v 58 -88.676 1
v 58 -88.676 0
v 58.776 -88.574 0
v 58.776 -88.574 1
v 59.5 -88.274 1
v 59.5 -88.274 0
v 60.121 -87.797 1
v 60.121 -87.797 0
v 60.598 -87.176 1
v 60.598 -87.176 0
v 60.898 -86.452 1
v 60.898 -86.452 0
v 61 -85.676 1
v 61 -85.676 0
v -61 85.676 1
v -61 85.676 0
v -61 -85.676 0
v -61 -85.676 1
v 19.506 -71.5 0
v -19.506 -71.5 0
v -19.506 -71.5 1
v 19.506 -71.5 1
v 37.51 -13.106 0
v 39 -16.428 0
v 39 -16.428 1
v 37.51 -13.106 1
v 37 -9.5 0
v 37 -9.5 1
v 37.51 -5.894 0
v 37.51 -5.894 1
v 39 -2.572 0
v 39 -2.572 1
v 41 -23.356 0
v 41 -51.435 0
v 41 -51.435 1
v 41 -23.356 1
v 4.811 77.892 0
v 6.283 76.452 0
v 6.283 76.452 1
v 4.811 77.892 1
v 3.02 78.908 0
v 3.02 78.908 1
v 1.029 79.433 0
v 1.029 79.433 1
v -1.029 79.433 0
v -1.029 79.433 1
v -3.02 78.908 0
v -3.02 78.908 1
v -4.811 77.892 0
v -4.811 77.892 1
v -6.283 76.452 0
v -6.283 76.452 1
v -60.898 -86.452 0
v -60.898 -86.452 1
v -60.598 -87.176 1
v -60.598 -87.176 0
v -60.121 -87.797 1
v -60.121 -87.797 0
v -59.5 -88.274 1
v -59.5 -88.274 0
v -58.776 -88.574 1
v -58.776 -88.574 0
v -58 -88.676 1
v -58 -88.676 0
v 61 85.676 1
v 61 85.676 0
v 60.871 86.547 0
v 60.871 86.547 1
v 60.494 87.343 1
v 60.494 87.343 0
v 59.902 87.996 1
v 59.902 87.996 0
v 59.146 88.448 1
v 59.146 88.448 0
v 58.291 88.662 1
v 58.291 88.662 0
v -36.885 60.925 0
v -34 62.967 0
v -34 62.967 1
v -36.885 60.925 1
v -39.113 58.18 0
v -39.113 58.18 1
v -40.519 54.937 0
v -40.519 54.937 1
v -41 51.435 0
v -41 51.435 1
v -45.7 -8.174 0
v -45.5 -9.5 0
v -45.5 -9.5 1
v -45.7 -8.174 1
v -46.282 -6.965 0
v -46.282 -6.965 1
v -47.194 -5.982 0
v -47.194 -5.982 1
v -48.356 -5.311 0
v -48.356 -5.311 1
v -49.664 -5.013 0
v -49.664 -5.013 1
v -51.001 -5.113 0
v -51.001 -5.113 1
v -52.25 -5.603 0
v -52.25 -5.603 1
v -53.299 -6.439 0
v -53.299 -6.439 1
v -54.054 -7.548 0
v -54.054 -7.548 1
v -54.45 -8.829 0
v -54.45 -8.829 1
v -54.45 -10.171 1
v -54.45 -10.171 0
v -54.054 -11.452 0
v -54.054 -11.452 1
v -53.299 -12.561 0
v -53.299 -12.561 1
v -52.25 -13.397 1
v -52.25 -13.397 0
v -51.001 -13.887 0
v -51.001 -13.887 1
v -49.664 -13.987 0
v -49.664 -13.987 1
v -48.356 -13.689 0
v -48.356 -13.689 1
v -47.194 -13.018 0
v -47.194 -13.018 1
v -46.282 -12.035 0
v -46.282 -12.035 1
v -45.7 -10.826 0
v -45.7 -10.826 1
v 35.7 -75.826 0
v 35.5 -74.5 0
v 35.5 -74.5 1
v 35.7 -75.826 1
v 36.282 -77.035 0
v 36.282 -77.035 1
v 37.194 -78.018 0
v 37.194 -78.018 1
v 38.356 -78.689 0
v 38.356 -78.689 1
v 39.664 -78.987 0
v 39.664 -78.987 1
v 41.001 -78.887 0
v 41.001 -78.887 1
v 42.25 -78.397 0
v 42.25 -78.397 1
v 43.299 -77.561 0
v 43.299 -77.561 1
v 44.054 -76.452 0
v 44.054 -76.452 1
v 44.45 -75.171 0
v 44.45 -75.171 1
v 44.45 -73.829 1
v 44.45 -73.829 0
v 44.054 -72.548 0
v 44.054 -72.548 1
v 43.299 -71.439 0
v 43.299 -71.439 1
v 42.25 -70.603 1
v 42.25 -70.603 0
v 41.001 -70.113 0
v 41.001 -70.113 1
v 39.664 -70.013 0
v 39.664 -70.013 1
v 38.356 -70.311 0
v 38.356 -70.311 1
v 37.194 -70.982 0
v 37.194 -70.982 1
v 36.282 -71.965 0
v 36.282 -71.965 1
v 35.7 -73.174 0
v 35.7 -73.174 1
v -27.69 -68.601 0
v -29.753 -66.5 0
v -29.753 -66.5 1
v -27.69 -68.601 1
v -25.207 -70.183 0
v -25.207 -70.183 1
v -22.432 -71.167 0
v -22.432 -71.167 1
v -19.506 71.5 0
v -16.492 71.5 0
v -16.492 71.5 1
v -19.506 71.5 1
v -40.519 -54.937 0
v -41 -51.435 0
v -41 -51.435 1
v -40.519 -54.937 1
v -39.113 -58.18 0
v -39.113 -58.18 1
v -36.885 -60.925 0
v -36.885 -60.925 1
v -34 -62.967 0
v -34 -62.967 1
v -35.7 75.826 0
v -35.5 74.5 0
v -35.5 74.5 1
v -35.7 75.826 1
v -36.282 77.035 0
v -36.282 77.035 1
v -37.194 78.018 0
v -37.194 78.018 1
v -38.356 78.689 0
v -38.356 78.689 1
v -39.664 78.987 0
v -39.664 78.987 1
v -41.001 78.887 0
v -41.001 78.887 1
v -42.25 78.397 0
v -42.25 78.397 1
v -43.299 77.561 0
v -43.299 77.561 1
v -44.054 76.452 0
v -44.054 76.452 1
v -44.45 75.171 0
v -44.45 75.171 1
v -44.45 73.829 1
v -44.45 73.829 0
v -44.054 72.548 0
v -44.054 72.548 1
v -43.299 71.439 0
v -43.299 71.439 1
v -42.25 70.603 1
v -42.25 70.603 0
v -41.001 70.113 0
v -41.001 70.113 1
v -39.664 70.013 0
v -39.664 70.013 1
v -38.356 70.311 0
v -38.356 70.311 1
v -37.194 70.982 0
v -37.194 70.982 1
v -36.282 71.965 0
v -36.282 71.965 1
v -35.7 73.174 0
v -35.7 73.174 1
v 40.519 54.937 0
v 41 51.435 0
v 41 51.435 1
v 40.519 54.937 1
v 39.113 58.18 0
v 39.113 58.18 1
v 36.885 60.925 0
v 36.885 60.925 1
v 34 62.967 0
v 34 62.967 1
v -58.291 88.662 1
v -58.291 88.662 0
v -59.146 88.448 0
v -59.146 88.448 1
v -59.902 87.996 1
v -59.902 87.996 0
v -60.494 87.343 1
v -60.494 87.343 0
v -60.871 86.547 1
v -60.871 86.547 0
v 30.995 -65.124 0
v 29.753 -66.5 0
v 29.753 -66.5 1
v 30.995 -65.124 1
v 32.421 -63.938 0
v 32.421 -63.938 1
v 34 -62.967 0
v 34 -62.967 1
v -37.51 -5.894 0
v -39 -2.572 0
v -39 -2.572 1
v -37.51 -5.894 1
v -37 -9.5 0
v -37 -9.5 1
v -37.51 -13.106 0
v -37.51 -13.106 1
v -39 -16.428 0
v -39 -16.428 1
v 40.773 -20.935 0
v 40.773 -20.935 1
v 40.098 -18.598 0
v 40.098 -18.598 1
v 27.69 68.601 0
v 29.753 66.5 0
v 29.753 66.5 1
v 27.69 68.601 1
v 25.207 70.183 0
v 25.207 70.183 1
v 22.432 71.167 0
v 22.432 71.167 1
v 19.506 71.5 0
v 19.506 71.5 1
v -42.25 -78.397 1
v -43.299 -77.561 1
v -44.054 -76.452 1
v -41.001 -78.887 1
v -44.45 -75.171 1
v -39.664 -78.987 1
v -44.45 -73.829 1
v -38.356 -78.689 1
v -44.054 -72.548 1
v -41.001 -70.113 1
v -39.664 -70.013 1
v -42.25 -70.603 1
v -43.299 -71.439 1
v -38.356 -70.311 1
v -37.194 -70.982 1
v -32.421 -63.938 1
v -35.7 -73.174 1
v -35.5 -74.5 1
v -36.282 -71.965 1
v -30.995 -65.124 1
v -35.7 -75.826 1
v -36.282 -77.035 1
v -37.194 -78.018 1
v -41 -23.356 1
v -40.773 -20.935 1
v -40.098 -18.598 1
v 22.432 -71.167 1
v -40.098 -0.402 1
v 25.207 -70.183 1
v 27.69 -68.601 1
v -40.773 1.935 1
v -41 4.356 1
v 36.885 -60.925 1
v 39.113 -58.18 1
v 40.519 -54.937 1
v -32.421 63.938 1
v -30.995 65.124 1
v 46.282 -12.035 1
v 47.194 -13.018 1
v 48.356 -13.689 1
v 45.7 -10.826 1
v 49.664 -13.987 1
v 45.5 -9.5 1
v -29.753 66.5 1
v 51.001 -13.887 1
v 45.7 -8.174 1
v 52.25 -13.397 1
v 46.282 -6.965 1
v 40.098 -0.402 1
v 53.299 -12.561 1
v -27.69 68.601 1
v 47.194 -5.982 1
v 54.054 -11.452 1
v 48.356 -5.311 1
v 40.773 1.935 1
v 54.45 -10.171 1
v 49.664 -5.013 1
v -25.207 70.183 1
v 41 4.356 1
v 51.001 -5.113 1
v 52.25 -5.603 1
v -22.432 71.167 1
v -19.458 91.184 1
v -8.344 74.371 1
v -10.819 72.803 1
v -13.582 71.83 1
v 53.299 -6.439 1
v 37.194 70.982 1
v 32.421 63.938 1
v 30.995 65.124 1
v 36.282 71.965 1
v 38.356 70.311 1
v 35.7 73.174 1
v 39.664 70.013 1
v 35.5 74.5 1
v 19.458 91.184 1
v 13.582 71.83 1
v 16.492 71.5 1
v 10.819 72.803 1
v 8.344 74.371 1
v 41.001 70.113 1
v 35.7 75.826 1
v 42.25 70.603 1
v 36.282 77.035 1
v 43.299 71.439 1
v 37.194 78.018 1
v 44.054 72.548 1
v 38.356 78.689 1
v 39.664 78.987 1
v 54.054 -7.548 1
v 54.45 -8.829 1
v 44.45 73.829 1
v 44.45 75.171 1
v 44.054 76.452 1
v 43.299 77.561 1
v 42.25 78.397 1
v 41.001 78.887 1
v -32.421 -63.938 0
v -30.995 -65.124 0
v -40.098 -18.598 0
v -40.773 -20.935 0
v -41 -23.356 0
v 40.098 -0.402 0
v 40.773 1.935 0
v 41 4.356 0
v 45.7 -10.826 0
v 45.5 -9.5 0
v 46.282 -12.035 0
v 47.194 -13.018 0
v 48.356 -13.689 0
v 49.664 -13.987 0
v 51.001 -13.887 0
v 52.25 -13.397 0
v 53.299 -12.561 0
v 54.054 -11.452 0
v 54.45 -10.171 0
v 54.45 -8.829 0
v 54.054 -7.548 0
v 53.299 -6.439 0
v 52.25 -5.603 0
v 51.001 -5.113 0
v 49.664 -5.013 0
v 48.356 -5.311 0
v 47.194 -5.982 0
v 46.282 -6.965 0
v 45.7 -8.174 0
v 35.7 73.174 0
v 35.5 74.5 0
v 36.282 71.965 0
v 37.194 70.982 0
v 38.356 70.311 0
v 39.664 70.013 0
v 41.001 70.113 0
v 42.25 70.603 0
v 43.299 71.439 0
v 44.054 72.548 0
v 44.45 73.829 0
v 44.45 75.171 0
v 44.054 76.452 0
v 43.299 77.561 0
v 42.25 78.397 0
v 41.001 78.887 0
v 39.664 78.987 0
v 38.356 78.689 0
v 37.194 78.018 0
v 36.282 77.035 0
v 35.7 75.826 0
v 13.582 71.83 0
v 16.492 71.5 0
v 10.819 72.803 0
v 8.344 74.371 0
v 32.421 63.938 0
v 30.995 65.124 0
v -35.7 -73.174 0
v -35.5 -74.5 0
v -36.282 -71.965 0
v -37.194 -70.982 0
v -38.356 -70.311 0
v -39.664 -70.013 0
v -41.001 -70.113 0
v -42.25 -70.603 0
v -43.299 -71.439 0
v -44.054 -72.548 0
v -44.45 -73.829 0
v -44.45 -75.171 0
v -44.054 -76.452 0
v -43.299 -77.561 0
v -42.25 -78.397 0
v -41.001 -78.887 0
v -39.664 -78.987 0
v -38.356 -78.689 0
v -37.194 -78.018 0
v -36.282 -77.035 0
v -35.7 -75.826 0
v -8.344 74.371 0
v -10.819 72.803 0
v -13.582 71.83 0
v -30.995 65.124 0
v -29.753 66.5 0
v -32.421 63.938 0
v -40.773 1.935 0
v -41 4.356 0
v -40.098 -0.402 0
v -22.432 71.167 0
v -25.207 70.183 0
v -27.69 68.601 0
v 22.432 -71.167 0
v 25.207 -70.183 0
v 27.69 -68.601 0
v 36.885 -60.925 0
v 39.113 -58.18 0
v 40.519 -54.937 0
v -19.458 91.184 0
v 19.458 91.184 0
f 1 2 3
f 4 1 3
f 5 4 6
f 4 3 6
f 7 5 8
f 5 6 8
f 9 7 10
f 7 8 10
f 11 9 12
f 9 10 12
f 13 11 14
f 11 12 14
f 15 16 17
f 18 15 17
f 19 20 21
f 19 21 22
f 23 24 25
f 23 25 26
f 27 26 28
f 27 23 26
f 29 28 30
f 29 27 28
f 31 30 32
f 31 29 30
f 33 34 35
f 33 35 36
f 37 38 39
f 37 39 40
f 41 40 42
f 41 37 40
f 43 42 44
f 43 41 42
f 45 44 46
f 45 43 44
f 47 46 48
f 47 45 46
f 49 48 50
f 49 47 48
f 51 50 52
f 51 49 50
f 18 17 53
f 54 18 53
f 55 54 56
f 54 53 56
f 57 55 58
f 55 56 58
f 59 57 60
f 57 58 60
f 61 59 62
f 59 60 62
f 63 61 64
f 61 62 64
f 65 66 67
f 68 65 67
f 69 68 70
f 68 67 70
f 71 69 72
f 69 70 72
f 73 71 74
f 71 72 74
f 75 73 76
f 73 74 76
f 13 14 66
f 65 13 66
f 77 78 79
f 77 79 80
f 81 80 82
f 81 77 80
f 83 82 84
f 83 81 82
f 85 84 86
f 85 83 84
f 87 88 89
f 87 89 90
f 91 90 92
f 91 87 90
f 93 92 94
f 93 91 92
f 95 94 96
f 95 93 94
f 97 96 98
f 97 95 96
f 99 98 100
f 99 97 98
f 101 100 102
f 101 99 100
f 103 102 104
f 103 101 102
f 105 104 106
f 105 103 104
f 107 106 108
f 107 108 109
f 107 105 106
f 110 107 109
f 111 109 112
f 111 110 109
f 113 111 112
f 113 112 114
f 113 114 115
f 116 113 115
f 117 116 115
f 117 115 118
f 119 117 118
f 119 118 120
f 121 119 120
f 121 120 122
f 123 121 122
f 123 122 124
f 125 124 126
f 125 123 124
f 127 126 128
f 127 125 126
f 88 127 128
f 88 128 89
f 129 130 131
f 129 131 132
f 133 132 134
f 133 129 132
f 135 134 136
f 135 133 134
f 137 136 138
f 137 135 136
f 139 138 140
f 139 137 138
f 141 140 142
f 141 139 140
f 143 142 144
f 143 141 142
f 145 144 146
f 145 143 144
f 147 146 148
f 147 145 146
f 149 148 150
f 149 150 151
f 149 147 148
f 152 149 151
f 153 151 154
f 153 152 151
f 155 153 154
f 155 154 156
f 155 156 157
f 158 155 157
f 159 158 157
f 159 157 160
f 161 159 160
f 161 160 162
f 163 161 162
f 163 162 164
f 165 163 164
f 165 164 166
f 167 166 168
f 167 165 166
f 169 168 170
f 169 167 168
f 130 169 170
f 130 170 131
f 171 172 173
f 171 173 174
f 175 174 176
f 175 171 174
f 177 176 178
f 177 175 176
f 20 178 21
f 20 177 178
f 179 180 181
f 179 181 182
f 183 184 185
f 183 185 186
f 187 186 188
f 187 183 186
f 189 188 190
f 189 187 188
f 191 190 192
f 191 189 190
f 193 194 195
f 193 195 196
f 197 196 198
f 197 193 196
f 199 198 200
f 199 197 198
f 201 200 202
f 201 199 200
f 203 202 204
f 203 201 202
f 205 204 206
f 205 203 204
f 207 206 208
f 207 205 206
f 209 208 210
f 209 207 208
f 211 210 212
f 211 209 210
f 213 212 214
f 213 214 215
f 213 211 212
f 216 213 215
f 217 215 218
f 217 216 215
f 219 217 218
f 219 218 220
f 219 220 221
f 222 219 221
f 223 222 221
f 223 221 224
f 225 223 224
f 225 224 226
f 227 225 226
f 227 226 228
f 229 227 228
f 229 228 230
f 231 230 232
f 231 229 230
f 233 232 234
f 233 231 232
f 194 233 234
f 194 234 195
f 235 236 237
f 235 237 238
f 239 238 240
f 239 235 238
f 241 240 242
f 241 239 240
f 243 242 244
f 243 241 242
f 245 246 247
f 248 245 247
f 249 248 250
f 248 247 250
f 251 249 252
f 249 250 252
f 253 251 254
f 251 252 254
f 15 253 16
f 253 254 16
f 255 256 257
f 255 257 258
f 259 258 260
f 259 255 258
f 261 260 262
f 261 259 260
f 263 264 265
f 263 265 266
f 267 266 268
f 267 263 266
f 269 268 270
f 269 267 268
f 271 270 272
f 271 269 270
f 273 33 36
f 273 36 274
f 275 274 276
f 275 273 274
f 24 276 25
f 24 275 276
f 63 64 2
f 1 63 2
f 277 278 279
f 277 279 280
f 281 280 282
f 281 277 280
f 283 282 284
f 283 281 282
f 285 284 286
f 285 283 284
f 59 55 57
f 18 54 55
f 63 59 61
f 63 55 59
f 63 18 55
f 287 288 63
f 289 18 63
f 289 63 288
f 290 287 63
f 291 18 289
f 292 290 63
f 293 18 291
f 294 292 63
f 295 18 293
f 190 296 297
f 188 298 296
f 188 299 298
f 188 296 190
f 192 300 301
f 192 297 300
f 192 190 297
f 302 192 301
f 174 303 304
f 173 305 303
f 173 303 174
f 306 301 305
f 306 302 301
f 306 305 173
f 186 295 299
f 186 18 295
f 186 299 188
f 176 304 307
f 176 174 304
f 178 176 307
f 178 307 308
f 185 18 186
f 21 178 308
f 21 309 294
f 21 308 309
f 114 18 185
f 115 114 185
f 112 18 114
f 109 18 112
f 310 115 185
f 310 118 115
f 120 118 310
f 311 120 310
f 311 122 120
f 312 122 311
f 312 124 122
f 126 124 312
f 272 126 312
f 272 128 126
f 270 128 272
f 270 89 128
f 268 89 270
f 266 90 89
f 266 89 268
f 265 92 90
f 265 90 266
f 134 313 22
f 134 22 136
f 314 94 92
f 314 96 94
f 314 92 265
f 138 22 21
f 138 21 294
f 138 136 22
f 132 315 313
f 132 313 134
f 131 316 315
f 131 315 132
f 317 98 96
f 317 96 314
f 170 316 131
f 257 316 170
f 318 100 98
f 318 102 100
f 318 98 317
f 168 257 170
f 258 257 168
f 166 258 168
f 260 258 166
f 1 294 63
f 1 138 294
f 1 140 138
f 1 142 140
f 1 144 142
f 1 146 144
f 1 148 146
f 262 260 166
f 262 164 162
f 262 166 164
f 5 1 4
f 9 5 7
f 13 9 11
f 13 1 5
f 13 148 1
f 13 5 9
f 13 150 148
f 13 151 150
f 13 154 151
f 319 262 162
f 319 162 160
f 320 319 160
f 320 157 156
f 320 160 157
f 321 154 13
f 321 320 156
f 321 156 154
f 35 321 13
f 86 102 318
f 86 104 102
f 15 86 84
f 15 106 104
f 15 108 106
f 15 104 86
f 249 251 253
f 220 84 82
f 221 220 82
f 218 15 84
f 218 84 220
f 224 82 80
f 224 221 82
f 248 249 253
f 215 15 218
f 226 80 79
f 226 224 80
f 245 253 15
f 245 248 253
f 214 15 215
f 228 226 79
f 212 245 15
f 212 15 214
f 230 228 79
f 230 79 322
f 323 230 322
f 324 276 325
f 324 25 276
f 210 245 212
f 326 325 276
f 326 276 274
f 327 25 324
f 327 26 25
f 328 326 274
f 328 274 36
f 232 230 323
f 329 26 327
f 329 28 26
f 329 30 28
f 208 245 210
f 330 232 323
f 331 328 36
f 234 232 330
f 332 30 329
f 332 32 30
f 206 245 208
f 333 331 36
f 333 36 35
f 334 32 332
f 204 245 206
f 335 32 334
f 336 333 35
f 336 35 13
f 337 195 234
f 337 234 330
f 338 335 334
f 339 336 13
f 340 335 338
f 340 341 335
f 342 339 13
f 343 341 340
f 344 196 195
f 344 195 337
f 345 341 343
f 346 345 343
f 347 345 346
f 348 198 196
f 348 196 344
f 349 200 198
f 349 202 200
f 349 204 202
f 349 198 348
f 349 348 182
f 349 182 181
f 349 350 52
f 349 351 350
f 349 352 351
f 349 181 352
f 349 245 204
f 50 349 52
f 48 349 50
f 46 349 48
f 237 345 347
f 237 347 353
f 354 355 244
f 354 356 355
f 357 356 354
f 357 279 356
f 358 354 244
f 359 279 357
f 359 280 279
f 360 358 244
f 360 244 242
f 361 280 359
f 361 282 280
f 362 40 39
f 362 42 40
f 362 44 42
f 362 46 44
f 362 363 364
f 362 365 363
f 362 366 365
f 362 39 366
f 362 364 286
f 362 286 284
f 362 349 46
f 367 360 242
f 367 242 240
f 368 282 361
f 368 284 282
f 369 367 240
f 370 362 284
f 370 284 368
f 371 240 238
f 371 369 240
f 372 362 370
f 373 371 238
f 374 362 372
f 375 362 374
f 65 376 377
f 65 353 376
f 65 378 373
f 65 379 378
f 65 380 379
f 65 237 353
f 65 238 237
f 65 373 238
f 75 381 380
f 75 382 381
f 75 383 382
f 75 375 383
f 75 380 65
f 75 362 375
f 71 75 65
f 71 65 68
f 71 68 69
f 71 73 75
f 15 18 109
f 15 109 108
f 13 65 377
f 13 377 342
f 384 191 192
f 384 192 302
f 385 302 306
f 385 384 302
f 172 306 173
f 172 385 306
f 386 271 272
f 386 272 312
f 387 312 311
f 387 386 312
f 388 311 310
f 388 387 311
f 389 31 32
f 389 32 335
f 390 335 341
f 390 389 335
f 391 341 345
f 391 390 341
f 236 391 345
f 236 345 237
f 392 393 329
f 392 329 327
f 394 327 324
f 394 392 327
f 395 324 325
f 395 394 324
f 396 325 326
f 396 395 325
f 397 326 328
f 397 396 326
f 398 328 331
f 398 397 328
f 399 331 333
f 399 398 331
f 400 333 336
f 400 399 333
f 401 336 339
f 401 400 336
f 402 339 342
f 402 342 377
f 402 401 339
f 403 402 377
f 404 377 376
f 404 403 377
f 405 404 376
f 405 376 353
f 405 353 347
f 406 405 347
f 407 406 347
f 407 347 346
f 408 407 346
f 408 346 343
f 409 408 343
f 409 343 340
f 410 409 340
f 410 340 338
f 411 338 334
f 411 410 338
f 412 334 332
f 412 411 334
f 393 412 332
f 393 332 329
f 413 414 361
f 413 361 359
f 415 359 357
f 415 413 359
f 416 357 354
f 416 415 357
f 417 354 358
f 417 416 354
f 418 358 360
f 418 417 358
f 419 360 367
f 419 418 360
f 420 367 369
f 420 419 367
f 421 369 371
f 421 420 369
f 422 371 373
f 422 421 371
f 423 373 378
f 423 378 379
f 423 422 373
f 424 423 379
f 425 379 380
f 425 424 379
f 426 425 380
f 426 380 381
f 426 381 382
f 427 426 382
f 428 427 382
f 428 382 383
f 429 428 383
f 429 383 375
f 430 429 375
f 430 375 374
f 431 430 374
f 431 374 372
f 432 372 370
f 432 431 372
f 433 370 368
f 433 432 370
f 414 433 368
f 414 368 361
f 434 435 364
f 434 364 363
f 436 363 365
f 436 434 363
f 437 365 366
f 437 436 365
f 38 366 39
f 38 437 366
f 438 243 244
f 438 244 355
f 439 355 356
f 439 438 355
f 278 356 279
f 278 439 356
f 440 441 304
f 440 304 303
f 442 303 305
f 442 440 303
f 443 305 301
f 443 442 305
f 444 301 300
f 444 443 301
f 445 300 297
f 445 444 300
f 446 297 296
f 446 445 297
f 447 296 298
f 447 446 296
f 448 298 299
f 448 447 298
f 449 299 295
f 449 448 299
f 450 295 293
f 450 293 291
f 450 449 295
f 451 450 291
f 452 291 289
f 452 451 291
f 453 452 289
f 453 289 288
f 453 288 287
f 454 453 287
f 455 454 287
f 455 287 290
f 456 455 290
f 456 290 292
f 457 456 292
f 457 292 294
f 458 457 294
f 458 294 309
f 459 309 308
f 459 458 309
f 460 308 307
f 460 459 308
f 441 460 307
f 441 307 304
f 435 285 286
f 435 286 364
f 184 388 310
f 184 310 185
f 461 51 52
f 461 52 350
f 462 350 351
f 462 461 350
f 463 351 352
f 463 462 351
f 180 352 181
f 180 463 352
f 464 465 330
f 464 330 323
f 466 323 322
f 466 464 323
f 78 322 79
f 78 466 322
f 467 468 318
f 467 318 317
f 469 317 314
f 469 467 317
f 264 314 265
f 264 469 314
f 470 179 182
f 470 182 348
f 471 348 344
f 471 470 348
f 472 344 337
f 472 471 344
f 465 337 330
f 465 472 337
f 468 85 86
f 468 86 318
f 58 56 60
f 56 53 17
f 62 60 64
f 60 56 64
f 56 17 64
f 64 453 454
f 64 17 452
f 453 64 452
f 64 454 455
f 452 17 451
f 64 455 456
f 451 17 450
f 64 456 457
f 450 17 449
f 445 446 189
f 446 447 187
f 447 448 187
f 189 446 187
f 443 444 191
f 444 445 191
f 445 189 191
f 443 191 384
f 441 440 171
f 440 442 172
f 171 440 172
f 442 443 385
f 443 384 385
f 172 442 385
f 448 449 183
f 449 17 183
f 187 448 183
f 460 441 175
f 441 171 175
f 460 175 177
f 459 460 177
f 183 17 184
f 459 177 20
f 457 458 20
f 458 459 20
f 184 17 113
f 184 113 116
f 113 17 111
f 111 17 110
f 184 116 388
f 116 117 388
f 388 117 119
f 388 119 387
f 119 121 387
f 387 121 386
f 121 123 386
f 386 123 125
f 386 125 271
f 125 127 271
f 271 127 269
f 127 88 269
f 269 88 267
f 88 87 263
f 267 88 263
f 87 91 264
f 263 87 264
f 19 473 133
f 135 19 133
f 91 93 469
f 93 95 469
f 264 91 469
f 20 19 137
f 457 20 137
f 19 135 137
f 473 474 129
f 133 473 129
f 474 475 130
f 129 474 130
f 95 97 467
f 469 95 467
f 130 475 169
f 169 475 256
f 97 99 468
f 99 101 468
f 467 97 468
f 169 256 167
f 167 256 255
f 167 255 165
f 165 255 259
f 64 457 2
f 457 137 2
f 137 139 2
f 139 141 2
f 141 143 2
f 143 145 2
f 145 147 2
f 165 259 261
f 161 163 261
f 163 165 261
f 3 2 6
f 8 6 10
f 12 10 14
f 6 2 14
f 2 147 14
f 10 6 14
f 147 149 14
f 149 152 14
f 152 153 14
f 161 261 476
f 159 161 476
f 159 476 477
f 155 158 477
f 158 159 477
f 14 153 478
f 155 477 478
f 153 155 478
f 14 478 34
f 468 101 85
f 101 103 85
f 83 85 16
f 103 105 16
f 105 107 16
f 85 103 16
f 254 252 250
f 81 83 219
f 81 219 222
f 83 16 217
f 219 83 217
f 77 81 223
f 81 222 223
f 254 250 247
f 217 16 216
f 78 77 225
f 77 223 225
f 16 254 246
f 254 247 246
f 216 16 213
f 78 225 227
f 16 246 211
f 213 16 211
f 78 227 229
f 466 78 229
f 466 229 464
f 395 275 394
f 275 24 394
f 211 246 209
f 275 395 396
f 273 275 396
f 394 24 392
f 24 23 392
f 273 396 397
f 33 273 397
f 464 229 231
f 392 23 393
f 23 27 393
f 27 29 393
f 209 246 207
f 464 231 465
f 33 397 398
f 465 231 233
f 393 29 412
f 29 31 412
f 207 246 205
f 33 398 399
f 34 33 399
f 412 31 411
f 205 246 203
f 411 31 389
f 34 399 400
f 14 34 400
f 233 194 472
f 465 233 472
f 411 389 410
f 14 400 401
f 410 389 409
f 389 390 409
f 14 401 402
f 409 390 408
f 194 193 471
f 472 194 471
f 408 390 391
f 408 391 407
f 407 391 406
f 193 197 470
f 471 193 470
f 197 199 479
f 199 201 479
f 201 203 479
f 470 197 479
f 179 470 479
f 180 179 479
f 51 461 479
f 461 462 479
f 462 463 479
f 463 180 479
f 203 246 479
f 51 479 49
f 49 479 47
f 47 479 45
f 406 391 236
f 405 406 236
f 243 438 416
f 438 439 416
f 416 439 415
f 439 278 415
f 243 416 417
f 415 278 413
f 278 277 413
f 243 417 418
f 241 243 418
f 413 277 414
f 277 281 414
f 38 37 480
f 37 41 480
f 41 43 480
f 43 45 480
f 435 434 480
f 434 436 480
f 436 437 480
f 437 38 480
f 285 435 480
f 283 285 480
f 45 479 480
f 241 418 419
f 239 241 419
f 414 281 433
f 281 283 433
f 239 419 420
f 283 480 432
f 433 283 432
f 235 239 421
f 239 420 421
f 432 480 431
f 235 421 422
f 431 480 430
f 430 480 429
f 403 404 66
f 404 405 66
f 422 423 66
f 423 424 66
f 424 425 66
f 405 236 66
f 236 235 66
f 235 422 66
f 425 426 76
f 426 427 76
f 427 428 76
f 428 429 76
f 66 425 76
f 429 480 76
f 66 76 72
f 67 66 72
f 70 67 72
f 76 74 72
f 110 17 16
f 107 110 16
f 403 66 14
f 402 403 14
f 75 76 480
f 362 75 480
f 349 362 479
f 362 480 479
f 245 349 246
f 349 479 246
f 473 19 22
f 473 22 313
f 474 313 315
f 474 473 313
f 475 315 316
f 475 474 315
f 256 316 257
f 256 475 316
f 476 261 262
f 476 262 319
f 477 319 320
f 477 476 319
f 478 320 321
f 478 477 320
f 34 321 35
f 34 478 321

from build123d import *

# Parameters (mm, degrees)
SKETCH1_R           = 4.5
BOSS_EXTRUDE1_DEPTH = 1


with BuildPart() as part:
    # Sketch1 → Boss-Extrude1 (new body)
    with BuildSketch(Plane.XY):
        with BuildLine():
            Line((-61, 85.675899882), (-61, -85.675899882))
            ThreePointArc((-61, -85.675899882), (-60.121320344, -87.797220225), (-58, -88.675899882))
            Line((-58, -88.675899882), (58, -88.675899882))
            ThreePointArc((58, -88.675899882), (60.121320344, -87.797220225), (61, -85.675899882))
            Line((61, -85.675899882), (61, 85.675899882))
            ThreePointArc((61, 85.675899882), (60.221977932, 87.691542228), (58.291457286, 88.661708424))
            ThreePointArc((58.291457286, 88.661708424), (0, 91.5), (-58.291457286, 88.661708424))
            ThreePointArc((-58.291457286, 88.661708424), (-60.221977932, 87.691542228), (-61, 85.675899882))
        make_face()
        with Locations((-40, 74.5)):
            Circle(SKETCH1_R, mode=Mode.SUBTRACT)
        with Locations((-50, -9.5)):
            Circle(SKETCH1_R, mode=Mode.SUBTRACT)
        with Locations((-40, -74.5)):
            Circle(SKETCH1_R, mode=Mode.SUBTRACT)
        with Locations(Location((40, -74.5, 0), (0, 0, 180))):
            Circle(SKETCH1_R, mode=Mode.SUBTRACT)
        with Locations(Location((50, -9.5, 0), (0, 0, 180))):
            Circle(SKETCH1_R, mode=Mode.SUBTRACT)
        with Locations(Location((40, 74.5, 0), (0, 0, 180))):
            Circle(SKETCH1_R, mode=Mode.SUBTRACT)
        with BuildLine():
            Line((-41, -23.356406461), (-41, -51.434874811))
            ThreePointArc((-41, -51.434874811), (-39.113055385, -58.180243592), (-34, -62.967437405))
            ThreePointArc((-34, -62.967437405), (-31.68672135, -64.505531626), (-29.753049234, -66.5))
            ThreePointArc((-29.753049234, -66.5), (-25.206975594, -70.183321446), (-19.506098468, -71.5))
            Line((-19.506098468, -71.5), (19.506098468, -71.5))
            ThreePointArc((19.506098468, -71.5), (25.206975594, -70.183321446), (29.753049234, -66.5))
            ThreePointArc((29.753049234, -66.5), (31.68672135, -64.505531626), (34, -62.967437405))
            ThreePointArc((34, -62.967437405), (39.113055385, -58.180243592), (41, -51.434874811))
            Line((41, -51.434874811), (41, -23.356406461))
            ThreePointArc((41, -23.356406461), (40.489995997, -19.750855185), (39, -16.42820323))
            ThreePointArc((39, -16.42820323), (37, -9.5), (39, -2.57179677))
            ThreePointArc((39, -2.57179677), (40.489995997, 0.750855185), (41, 4.356406461))
            Line((41, 4.356406461), (41, 51.434874811))
            ThreePointArc((41, 51.434874811), (39.113055385, 58.180243592), (34, 62.967437405))
            ThreePointArc((34, 62.967437405), (31.68672135, 64.505531626), (29.753049234, 66.5))
            ThreePointArc((29.753049234, 66.5), (25.206975594, 70.183321446), (19.506098468, 71.5))
            Line((19.506098468, 71.5), (16.492422502, 71.5))
            ThreePointArc((16.492422502, 71.5), (10.818757356, 72.803439659), (6.28282762, 76.452380952))
            ThreePointArc((6.28282762, 76.452380952), (0, 79.5), (-6.28282762, 76.452380952))
            ThreePointArc((-6.28282762, 76.452380952), (-10.818757356, 72.803439659), (-16.492422502, 71.5))
            Line((-16.492422502, 71.5), (-19.506098468, 71.5))
            ThreePointArc((-19.506098468, 71.5), (-25.206975594, 70.183321446), (-29.753049234, 66.5))
            ThreePointArc((-29.753049234, 66.5), (-31.68672135, 64.505531626), (-34, 62.967437405))
            ThreePointArc((-34, 62.967437405), (-39.113055385, 58.180243592), (-41, 51.434874811))
            Line((-41, 51.434874811), (-41, 4.356406461))
            ThreePointArc((-41, 4.356406461), (-40.489995997, 0.750855185), (-39, -2.57179677))
            ThreePointArc((-39, -2.57179677), (-37, -9.5), (-39, -16.42820323))
            ThreePointArc((-39, -16.42820323), (-40.489995997, -19.750855185), (-41, -23.356406461))
        make_face(mode=Mode.SUBTRACT)
    extrude(amount=BOSS_EXTRUDE1_DEPTH)


solid = part.part
